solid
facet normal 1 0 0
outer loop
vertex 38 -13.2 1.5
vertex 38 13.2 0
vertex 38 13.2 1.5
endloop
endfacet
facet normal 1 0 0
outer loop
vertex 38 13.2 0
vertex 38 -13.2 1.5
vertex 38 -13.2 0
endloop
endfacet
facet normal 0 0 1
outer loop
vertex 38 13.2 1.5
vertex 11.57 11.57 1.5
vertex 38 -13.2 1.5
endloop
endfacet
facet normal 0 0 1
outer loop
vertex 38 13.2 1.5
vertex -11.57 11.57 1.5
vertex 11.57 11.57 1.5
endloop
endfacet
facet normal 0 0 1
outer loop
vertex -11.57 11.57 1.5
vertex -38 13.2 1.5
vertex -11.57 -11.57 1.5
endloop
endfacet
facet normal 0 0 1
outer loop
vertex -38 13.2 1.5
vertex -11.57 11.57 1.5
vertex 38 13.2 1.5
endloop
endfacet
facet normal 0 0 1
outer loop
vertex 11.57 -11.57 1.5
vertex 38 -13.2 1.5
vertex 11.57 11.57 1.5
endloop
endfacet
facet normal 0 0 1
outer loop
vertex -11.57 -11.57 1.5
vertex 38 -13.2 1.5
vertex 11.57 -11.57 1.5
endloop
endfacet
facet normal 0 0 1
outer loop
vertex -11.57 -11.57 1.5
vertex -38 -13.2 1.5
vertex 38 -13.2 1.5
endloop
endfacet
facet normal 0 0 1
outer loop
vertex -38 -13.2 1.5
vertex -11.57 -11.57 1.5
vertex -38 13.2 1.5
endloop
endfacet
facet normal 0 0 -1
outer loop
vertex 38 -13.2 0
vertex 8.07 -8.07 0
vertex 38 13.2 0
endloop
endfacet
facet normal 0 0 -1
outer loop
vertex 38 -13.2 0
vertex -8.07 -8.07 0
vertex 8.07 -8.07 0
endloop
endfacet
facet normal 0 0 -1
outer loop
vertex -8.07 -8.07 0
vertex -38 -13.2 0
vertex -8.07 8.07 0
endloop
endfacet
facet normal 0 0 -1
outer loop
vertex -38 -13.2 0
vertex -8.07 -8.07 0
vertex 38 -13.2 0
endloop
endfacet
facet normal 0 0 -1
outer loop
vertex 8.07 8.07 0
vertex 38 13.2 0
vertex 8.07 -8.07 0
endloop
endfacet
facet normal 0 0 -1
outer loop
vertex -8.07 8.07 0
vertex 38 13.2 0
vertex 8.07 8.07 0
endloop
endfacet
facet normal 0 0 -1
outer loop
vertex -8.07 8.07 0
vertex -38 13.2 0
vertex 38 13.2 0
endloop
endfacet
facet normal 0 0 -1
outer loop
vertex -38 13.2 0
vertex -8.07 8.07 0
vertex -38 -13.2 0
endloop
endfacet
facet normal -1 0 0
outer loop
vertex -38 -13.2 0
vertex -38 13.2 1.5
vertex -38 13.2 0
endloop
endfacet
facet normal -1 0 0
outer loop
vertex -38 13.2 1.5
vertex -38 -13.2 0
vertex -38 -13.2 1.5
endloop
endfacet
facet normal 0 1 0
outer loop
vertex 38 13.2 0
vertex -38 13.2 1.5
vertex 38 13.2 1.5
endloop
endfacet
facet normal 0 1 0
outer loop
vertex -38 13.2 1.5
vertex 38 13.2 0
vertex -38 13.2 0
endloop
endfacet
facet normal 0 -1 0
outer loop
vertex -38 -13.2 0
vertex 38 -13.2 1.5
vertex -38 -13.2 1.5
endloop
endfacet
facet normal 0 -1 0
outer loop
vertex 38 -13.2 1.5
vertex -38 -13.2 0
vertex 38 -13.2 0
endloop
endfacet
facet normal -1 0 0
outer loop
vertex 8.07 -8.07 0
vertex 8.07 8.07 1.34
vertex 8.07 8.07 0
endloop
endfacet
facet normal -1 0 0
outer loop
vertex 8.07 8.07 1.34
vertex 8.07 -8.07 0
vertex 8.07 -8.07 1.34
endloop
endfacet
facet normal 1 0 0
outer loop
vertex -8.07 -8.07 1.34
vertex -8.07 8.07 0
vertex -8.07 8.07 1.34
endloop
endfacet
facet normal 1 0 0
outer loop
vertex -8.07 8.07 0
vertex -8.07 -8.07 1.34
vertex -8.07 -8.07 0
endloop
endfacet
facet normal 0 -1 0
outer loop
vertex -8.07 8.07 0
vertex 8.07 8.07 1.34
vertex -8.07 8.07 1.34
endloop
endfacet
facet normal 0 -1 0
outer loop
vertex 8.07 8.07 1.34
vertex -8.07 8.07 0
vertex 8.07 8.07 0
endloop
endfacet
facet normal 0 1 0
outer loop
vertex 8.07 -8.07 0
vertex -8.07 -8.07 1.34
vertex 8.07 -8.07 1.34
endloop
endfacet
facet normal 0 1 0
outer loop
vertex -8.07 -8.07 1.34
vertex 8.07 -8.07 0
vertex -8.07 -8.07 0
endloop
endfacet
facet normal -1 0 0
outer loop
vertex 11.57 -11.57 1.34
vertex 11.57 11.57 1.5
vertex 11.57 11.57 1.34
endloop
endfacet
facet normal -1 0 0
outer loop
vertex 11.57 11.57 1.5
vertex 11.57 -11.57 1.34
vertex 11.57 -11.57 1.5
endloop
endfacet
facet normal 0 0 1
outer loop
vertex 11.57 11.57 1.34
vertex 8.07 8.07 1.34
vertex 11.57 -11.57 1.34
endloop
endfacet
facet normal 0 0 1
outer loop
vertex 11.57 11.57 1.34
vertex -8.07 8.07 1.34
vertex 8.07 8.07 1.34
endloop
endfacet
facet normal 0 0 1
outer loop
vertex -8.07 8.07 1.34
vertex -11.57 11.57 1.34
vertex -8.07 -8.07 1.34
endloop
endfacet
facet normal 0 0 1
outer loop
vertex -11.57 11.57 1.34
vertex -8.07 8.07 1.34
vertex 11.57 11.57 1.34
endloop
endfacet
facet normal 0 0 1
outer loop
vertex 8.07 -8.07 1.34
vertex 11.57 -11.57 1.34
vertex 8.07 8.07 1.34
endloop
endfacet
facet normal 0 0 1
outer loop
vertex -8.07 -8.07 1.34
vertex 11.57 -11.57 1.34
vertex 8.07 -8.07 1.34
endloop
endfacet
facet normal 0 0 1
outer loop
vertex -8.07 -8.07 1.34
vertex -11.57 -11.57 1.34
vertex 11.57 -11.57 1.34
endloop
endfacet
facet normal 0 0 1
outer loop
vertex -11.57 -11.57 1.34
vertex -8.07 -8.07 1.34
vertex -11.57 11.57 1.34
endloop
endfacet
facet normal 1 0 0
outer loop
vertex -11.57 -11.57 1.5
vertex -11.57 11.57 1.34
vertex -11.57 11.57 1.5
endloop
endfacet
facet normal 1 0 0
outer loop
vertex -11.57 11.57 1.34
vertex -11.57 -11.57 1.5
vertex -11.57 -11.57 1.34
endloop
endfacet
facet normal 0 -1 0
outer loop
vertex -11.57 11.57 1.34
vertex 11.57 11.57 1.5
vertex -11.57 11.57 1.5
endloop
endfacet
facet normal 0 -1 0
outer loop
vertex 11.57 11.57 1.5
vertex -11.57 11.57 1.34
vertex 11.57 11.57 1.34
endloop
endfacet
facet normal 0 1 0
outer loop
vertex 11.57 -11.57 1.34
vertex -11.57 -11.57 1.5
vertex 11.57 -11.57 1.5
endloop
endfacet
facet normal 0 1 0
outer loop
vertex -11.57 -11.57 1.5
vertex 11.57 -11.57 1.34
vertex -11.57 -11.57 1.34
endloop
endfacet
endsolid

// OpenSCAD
coverSlipSize = 22.14;
coverSlipThickness = 0.16;
coverSlipOverlap = 3;
length = 76;
width = 26.4;
thickness = 1.5;
tolerance = 0.5;

module dummy() {}

nudge = 0.001;
slipHoleSize = coverSlipSize-2*coverSlipOverlap;
slipAdj = coverSlipSize + 2*tolerance;

render(convexity=2)
difference() {
    translate([-length/2,-width/2,0]) cube([length,width,thickness]);
    translate([-slipHoleSize/2,-slipHoleSize/2,-nudge]) cube([slipHoleSize,slipHoleSize,thickness+2*nudge]);
    translate([-slipAdj/2,-slipAdj/2,thickness-coverSlipThickness]) cube([slipAdj,slipAdj,coverSlipThickness+nudge]);
}
